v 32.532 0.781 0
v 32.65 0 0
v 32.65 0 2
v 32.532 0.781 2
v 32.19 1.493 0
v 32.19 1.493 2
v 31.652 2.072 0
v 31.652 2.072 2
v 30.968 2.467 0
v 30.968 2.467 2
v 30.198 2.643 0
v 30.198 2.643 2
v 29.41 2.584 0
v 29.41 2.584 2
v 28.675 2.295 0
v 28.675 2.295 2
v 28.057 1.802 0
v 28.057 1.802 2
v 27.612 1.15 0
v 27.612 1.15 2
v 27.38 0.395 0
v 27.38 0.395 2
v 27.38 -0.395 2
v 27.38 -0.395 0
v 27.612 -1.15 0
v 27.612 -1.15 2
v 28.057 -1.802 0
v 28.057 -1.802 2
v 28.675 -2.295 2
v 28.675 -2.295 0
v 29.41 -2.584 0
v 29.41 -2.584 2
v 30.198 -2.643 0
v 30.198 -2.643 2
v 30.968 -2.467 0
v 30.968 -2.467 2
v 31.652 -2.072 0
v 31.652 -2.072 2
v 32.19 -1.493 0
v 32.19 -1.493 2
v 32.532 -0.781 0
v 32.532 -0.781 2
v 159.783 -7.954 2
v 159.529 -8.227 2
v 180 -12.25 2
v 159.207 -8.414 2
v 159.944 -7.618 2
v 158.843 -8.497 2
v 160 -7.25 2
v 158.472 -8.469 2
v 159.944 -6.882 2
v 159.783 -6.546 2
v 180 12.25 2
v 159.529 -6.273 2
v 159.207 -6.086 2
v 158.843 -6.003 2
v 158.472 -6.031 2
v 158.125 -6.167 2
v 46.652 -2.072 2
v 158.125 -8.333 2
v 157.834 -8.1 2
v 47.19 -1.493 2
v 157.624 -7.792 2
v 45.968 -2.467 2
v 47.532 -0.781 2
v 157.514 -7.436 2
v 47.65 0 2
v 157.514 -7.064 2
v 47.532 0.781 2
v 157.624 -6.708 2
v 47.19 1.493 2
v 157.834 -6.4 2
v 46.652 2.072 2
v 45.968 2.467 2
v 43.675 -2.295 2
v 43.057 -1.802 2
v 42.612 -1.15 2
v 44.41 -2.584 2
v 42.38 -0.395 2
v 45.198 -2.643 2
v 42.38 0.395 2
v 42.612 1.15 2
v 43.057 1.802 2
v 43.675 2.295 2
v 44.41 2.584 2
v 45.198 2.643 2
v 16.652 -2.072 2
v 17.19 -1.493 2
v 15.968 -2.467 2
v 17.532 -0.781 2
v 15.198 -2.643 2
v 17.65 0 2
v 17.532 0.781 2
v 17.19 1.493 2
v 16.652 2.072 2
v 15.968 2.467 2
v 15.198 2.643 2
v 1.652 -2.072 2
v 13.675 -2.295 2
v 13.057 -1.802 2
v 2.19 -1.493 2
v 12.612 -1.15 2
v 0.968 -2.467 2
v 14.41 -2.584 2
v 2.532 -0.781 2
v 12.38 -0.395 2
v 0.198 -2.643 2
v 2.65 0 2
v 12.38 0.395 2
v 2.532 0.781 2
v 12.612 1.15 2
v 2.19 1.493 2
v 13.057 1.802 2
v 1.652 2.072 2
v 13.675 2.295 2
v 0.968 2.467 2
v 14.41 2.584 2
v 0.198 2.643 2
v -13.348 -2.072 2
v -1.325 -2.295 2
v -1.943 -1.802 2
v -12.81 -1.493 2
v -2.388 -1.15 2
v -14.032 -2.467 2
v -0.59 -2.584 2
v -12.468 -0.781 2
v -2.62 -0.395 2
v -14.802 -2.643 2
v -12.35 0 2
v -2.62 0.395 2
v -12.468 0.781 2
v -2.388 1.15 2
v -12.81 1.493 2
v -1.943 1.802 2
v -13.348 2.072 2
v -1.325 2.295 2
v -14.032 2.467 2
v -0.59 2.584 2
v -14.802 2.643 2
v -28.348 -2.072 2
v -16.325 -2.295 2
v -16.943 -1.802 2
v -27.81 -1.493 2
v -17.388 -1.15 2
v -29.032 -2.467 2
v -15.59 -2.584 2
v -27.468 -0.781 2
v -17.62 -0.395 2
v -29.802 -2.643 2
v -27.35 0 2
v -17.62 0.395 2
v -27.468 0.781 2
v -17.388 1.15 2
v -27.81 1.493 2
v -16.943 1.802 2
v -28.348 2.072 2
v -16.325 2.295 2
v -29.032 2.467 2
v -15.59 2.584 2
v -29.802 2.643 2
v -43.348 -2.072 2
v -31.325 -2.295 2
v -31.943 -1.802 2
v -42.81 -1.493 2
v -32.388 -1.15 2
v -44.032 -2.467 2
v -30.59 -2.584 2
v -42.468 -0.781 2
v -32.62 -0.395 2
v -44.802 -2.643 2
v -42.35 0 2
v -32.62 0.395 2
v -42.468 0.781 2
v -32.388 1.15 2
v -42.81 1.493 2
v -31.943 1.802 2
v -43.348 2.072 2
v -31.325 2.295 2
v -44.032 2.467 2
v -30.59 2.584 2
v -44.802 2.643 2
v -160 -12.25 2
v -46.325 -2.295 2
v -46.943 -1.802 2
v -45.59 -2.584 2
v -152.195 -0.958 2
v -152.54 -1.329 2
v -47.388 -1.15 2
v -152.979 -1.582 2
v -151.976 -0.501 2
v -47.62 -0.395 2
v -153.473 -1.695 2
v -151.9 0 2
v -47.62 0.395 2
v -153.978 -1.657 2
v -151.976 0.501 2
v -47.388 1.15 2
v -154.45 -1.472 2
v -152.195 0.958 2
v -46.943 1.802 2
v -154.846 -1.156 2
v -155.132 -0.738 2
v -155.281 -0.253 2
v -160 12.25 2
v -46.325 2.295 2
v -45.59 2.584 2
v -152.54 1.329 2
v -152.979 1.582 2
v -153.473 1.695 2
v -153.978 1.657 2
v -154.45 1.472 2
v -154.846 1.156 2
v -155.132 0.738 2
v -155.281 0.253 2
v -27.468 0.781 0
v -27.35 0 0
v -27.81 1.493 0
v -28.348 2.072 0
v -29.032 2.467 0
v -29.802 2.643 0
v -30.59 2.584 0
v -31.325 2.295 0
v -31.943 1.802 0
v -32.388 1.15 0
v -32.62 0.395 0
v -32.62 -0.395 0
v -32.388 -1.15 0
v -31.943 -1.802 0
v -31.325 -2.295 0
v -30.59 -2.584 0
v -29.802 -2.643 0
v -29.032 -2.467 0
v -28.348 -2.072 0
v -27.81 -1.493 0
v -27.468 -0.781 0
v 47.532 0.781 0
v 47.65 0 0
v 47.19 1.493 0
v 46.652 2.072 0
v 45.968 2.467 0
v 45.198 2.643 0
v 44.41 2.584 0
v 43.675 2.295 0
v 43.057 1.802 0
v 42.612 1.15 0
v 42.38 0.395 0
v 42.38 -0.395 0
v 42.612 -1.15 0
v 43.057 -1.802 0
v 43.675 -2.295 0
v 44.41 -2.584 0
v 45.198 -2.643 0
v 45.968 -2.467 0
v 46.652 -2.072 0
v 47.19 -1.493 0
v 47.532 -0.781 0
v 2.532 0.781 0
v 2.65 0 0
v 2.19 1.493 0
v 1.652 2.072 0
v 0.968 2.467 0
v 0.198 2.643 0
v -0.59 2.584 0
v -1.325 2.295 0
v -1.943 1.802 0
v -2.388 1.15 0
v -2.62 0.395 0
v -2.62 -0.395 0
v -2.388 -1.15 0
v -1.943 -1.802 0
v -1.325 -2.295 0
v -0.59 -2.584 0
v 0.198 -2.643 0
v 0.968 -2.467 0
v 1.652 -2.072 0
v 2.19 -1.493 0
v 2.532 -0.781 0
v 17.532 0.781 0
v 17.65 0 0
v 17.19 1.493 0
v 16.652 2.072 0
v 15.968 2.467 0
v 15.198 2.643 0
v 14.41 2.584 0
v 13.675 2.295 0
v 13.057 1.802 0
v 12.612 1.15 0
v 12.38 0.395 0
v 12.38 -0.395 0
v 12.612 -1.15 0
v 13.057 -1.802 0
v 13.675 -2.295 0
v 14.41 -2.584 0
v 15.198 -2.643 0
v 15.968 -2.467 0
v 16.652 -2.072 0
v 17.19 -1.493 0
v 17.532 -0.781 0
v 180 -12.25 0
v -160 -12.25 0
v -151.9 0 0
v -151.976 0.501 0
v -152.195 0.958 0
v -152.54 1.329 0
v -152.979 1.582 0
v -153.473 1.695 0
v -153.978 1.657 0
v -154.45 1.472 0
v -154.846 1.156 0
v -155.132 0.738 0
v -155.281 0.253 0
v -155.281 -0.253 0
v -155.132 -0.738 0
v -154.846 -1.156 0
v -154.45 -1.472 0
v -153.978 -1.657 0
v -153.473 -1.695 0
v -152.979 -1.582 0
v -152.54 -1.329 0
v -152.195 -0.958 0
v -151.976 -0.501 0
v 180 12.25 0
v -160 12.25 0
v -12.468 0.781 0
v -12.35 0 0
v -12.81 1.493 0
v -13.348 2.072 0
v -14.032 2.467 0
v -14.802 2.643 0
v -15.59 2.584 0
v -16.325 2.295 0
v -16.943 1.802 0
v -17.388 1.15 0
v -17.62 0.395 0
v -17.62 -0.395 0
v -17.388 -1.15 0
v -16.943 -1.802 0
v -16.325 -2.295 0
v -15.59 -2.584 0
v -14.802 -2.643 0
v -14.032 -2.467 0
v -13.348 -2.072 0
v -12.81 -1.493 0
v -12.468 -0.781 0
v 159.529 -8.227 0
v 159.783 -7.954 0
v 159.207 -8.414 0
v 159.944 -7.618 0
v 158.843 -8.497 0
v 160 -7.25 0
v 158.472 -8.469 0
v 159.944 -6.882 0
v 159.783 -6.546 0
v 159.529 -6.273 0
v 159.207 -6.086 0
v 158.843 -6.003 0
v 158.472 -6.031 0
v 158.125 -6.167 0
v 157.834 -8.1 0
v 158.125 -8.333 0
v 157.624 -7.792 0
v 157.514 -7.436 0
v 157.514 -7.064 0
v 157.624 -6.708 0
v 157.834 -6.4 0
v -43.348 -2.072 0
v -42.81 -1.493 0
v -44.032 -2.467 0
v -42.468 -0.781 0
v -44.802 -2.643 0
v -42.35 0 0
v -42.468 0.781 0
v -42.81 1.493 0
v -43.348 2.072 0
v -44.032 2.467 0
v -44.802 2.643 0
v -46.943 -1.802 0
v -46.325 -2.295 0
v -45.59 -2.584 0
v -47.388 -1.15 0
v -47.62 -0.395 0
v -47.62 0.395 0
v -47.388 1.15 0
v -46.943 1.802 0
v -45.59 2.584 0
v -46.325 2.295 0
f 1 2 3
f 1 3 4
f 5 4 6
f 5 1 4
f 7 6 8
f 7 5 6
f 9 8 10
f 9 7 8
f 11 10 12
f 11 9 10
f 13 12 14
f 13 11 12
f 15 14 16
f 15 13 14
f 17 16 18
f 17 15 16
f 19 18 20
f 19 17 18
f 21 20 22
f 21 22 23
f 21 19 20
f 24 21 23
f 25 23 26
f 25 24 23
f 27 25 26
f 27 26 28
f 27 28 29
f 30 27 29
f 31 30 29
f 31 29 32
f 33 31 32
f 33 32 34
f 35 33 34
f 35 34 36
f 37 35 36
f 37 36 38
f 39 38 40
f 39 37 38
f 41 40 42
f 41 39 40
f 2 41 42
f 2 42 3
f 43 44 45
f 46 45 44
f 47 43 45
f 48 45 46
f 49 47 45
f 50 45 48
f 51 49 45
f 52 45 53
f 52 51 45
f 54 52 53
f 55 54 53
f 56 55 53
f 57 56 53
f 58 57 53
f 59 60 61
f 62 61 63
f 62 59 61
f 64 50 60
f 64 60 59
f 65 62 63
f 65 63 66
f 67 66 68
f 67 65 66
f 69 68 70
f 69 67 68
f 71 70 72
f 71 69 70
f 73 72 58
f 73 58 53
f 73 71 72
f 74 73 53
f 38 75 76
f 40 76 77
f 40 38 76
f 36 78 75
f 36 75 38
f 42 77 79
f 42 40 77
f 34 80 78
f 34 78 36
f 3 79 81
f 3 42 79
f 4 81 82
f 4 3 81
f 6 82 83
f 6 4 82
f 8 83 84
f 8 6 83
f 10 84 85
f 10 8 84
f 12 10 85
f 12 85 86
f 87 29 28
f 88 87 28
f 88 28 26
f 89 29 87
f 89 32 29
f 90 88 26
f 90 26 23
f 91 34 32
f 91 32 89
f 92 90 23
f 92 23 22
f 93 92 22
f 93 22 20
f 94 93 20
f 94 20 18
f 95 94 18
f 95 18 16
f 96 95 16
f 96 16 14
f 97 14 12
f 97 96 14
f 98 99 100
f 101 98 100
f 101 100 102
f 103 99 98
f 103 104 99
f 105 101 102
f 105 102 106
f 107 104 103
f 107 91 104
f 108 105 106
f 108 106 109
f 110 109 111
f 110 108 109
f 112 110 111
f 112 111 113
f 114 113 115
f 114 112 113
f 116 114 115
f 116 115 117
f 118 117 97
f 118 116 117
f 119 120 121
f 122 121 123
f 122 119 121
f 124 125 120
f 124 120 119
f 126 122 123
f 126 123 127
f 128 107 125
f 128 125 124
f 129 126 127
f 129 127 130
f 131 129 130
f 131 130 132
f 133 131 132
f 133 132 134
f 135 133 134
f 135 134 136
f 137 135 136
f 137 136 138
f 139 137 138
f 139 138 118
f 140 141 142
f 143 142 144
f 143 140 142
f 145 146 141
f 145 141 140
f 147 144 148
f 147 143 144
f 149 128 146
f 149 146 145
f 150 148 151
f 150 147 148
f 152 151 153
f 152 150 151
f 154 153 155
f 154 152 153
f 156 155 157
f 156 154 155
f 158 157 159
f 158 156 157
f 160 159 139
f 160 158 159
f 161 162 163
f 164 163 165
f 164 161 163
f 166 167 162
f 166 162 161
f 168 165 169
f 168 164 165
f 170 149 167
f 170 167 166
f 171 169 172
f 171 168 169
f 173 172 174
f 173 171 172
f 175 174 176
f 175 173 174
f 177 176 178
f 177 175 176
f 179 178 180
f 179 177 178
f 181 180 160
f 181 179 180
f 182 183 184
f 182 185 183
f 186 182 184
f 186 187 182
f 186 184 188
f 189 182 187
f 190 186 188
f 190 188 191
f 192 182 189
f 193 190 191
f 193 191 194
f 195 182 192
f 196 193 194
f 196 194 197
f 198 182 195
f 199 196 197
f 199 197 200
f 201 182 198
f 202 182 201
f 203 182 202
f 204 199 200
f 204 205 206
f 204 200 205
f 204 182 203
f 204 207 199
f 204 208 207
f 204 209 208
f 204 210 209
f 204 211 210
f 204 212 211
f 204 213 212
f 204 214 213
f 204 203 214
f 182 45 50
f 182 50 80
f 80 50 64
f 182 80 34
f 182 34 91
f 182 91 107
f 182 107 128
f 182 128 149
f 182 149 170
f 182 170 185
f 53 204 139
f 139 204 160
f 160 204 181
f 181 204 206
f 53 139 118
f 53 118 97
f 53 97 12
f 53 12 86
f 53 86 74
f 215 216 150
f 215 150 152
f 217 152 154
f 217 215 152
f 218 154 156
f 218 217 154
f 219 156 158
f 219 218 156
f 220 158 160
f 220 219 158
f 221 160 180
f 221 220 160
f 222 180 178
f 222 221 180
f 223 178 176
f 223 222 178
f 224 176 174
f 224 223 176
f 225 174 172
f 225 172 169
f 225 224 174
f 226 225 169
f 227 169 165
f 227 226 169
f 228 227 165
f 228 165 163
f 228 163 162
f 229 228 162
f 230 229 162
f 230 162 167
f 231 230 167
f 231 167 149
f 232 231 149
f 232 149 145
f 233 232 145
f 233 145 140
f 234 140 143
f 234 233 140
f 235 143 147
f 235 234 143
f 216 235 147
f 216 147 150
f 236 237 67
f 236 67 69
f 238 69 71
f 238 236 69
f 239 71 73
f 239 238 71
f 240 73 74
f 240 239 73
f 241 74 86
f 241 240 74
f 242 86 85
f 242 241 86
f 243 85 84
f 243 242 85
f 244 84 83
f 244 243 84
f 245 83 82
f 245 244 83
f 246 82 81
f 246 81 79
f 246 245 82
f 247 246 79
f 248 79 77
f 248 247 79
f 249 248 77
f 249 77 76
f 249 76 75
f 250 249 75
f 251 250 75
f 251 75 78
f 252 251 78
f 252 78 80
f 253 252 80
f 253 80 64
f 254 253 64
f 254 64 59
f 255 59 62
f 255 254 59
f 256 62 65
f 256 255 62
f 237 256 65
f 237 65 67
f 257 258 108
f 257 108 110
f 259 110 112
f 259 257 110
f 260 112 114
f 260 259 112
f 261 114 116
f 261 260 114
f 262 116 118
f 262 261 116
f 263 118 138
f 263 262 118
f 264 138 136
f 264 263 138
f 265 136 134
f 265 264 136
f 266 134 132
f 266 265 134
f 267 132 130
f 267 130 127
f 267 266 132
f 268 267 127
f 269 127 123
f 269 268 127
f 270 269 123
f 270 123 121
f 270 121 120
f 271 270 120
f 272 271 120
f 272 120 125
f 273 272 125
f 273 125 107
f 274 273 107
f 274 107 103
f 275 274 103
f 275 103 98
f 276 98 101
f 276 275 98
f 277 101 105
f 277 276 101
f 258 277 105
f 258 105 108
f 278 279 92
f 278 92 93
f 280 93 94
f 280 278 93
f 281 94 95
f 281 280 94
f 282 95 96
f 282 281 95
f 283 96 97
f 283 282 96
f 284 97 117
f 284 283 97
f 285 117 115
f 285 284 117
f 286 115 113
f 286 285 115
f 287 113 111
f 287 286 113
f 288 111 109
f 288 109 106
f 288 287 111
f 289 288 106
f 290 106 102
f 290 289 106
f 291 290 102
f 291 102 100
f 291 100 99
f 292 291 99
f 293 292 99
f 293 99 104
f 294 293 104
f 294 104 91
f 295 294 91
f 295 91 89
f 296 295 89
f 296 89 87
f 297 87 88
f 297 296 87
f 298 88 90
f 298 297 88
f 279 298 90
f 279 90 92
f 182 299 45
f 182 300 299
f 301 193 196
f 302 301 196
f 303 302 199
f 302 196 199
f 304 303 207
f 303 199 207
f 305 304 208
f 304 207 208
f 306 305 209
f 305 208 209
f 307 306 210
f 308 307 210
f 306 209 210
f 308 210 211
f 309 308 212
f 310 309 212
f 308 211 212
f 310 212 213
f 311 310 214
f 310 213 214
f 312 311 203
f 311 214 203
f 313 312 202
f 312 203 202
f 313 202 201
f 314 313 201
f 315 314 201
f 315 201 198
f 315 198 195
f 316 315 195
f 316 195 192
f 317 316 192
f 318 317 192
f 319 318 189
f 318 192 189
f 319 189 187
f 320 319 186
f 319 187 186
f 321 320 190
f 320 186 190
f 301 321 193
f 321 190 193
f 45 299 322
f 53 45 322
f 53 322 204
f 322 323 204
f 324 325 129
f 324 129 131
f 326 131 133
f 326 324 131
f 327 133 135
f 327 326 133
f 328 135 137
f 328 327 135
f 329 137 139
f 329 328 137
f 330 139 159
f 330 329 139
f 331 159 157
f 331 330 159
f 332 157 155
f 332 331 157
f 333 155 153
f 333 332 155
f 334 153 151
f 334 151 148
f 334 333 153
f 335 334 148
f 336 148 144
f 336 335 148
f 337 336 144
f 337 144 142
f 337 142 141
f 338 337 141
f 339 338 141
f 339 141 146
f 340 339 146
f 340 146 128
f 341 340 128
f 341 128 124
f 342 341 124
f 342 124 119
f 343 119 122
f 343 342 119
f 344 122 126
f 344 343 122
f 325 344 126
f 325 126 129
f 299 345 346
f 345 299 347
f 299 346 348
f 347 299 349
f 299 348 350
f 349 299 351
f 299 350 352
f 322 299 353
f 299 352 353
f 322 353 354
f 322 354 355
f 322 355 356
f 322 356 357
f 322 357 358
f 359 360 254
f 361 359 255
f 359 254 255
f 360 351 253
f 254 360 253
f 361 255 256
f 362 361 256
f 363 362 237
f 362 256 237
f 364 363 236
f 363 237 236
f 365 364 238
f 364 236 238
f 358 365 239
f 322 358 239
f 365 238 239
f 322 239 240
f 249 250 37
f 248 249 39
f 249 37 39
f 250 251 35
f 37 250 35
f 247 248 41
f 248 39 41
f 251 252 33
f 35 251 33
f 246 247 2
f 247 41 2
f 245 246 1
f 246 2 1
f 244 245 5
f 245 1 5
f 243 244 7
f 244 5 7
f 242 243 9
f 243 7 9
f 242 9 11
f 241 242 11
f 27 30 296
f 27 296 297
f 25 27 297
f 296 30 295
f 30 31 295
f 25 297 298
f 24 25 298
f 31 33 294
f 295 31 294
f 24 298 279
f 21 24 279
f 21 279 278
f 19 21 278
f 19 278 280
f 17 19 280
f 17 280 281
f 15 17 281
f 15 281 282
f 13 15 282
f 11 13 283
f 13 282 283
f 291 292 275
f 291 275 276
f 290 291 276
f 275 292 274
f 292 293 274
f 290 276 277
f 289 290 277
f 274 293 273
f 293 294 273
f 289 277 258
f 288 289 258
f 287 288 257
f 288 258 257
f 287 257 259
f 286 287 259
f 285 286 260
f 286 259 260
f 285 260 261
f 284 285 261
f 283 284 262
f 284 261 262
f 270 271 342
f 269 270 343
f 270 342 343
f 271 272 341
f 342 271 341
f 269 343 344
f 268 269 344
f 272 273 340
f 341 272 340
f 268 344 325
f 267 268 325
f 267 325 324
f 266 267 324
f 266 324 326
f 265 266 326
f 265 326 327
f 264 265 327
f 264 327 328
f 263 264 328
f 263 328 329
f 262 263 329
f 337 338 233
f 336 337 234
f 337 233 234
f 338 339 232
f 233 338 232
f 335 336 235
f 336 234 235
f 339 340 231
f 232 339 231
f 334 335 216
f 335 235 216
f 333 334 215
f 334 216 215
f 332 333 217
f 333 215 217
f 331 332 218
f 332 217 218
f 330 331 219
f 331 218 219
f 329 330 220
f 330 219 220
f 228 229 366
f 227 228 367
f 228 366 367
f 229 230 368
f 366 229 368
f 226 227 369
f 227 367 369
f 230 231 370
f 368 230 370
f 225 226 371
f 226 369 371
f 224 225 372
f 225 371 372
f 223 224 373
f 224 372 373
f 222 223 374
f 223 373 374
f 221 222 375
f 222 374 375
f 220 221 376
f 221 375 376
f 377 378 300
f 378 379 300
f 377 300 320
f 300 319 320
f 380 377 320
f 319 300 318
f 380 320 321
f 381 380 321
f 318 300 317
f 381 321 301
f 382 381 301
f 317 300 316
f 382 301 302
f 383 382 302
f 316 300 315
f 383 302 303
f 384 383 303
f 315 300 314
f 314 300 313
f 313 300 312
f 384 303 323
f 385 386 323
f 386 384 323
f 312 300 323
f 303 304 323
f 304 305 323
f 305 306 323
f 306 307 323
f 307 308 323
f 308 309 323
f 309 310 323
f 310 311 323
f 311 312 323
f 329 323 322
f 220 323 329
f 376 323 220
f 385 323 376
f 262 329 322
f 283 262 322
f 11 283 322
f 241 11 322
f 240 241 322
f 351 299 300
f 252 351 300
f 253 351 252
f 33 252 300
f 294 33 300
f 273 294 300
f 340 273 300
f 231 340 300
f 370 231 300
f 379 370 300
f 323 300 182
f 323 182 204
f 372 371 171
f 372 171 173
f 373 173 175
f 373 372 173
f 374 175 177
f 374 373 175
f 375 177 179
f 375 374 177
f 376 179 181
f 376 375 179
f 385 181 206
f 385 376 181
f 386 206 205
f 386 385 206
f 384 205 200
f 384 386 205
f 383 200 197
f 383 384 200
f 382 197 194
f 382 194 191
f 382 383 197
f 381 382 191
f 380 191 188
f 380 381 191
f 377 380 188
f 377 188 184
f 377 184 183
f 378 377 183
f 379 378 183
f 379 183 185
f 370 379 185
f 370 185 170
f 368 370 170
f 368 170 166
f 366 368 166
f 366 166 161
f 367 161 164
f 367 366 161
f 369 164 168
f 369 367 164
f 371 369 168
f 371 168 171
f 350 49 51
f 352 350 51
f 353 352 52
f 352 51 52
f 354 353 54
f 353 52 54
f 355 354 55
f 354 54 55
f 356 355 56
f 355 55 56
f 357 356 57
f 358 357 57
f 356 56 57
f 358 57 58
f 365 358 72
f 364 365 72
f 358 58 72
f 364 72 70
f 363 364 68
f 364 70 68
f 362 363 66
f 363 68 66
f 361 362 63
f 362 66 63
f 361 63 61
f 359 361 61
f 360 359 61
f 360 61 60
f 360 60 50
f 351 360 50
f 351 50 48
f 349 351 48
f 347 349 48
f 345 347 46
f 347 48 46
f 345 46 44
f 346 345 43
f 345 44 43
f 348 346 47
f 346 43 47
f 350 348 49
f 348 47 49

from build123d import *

# Parameters (mm, degrees)
F0_W     = 300
F0_H     = 24.5
F0_R     = 2.65
F1_DEPTH = 2
F2_DEPTH = 10
F3_DEPTH = 30
F4_R     = 1.7
F5_DEPTH = 2
F6_R     = 1.25
F7_DEPTH = 2


with BuildPart() as f1:
    # F0 (on Top) → F1 (new body)
    with BuildSketch(Plane.XY):
        Rectangle(F0_W, F0_H)
        with Locations((-45, 0)):
            Circle(F0_R, mode=Mode.SUBTRACT)
        with Locations((-30, 0)):
            Circle(F0_R, mode=Mode.SUBTRACT)
        with Locations((-15, 0)):
            Circle(F0_R, mode=Mode.SUBTRACT)
        Circle(F0_R, mode=Mode.SUBTRACT)
        with Locations((15, 0)):
            Circle(F0_R, mode=Mode.SUBTRACT)
        with Locations((30, 0)):
            Circle(F0_R, mode=Mode.SUBTRACT)
        with Locations((45, 0)):
            Circle(F0_R, mode=Mode.SUBTRACT)
    extrude(amount=F1_DEPTH)

    # F2 (add): a face of the model
    f2_faces = [f1.faces().sort_by_distance(p)[0] for p in [
        (-150, 0, 1),
    ]]
    extrude(f2_faces, amount=F2_DEPTH)

    # F3 (add): a face of the model
    f3_faces = [f1.faces().sort_by_distance(p)[0] for p in [
        (150, 0, 1),
    ]]
    extrude(f3_faces, amount=F3_DEPTH)

    # F4 (on face) → F5 (cut, through all)
    with BuildSketch(Plane.XY.offset(2)):
        with Locations((-153.6, 0)):
            Circle(F4_R)
    extrude(amount=-F5_DEPTH, mode=Mode.SUBTRACT)

    # F6 (on face) → F7 (cut, through all)
    with BuildSketch(Plane.XY.offset(2)):
        with Locations((158.75, -7.25)):
            Circle(F6_R)
    extrude(amount=-F7_DEPTH, mode=Mode.SUBTRACT)


solid = f1.part
